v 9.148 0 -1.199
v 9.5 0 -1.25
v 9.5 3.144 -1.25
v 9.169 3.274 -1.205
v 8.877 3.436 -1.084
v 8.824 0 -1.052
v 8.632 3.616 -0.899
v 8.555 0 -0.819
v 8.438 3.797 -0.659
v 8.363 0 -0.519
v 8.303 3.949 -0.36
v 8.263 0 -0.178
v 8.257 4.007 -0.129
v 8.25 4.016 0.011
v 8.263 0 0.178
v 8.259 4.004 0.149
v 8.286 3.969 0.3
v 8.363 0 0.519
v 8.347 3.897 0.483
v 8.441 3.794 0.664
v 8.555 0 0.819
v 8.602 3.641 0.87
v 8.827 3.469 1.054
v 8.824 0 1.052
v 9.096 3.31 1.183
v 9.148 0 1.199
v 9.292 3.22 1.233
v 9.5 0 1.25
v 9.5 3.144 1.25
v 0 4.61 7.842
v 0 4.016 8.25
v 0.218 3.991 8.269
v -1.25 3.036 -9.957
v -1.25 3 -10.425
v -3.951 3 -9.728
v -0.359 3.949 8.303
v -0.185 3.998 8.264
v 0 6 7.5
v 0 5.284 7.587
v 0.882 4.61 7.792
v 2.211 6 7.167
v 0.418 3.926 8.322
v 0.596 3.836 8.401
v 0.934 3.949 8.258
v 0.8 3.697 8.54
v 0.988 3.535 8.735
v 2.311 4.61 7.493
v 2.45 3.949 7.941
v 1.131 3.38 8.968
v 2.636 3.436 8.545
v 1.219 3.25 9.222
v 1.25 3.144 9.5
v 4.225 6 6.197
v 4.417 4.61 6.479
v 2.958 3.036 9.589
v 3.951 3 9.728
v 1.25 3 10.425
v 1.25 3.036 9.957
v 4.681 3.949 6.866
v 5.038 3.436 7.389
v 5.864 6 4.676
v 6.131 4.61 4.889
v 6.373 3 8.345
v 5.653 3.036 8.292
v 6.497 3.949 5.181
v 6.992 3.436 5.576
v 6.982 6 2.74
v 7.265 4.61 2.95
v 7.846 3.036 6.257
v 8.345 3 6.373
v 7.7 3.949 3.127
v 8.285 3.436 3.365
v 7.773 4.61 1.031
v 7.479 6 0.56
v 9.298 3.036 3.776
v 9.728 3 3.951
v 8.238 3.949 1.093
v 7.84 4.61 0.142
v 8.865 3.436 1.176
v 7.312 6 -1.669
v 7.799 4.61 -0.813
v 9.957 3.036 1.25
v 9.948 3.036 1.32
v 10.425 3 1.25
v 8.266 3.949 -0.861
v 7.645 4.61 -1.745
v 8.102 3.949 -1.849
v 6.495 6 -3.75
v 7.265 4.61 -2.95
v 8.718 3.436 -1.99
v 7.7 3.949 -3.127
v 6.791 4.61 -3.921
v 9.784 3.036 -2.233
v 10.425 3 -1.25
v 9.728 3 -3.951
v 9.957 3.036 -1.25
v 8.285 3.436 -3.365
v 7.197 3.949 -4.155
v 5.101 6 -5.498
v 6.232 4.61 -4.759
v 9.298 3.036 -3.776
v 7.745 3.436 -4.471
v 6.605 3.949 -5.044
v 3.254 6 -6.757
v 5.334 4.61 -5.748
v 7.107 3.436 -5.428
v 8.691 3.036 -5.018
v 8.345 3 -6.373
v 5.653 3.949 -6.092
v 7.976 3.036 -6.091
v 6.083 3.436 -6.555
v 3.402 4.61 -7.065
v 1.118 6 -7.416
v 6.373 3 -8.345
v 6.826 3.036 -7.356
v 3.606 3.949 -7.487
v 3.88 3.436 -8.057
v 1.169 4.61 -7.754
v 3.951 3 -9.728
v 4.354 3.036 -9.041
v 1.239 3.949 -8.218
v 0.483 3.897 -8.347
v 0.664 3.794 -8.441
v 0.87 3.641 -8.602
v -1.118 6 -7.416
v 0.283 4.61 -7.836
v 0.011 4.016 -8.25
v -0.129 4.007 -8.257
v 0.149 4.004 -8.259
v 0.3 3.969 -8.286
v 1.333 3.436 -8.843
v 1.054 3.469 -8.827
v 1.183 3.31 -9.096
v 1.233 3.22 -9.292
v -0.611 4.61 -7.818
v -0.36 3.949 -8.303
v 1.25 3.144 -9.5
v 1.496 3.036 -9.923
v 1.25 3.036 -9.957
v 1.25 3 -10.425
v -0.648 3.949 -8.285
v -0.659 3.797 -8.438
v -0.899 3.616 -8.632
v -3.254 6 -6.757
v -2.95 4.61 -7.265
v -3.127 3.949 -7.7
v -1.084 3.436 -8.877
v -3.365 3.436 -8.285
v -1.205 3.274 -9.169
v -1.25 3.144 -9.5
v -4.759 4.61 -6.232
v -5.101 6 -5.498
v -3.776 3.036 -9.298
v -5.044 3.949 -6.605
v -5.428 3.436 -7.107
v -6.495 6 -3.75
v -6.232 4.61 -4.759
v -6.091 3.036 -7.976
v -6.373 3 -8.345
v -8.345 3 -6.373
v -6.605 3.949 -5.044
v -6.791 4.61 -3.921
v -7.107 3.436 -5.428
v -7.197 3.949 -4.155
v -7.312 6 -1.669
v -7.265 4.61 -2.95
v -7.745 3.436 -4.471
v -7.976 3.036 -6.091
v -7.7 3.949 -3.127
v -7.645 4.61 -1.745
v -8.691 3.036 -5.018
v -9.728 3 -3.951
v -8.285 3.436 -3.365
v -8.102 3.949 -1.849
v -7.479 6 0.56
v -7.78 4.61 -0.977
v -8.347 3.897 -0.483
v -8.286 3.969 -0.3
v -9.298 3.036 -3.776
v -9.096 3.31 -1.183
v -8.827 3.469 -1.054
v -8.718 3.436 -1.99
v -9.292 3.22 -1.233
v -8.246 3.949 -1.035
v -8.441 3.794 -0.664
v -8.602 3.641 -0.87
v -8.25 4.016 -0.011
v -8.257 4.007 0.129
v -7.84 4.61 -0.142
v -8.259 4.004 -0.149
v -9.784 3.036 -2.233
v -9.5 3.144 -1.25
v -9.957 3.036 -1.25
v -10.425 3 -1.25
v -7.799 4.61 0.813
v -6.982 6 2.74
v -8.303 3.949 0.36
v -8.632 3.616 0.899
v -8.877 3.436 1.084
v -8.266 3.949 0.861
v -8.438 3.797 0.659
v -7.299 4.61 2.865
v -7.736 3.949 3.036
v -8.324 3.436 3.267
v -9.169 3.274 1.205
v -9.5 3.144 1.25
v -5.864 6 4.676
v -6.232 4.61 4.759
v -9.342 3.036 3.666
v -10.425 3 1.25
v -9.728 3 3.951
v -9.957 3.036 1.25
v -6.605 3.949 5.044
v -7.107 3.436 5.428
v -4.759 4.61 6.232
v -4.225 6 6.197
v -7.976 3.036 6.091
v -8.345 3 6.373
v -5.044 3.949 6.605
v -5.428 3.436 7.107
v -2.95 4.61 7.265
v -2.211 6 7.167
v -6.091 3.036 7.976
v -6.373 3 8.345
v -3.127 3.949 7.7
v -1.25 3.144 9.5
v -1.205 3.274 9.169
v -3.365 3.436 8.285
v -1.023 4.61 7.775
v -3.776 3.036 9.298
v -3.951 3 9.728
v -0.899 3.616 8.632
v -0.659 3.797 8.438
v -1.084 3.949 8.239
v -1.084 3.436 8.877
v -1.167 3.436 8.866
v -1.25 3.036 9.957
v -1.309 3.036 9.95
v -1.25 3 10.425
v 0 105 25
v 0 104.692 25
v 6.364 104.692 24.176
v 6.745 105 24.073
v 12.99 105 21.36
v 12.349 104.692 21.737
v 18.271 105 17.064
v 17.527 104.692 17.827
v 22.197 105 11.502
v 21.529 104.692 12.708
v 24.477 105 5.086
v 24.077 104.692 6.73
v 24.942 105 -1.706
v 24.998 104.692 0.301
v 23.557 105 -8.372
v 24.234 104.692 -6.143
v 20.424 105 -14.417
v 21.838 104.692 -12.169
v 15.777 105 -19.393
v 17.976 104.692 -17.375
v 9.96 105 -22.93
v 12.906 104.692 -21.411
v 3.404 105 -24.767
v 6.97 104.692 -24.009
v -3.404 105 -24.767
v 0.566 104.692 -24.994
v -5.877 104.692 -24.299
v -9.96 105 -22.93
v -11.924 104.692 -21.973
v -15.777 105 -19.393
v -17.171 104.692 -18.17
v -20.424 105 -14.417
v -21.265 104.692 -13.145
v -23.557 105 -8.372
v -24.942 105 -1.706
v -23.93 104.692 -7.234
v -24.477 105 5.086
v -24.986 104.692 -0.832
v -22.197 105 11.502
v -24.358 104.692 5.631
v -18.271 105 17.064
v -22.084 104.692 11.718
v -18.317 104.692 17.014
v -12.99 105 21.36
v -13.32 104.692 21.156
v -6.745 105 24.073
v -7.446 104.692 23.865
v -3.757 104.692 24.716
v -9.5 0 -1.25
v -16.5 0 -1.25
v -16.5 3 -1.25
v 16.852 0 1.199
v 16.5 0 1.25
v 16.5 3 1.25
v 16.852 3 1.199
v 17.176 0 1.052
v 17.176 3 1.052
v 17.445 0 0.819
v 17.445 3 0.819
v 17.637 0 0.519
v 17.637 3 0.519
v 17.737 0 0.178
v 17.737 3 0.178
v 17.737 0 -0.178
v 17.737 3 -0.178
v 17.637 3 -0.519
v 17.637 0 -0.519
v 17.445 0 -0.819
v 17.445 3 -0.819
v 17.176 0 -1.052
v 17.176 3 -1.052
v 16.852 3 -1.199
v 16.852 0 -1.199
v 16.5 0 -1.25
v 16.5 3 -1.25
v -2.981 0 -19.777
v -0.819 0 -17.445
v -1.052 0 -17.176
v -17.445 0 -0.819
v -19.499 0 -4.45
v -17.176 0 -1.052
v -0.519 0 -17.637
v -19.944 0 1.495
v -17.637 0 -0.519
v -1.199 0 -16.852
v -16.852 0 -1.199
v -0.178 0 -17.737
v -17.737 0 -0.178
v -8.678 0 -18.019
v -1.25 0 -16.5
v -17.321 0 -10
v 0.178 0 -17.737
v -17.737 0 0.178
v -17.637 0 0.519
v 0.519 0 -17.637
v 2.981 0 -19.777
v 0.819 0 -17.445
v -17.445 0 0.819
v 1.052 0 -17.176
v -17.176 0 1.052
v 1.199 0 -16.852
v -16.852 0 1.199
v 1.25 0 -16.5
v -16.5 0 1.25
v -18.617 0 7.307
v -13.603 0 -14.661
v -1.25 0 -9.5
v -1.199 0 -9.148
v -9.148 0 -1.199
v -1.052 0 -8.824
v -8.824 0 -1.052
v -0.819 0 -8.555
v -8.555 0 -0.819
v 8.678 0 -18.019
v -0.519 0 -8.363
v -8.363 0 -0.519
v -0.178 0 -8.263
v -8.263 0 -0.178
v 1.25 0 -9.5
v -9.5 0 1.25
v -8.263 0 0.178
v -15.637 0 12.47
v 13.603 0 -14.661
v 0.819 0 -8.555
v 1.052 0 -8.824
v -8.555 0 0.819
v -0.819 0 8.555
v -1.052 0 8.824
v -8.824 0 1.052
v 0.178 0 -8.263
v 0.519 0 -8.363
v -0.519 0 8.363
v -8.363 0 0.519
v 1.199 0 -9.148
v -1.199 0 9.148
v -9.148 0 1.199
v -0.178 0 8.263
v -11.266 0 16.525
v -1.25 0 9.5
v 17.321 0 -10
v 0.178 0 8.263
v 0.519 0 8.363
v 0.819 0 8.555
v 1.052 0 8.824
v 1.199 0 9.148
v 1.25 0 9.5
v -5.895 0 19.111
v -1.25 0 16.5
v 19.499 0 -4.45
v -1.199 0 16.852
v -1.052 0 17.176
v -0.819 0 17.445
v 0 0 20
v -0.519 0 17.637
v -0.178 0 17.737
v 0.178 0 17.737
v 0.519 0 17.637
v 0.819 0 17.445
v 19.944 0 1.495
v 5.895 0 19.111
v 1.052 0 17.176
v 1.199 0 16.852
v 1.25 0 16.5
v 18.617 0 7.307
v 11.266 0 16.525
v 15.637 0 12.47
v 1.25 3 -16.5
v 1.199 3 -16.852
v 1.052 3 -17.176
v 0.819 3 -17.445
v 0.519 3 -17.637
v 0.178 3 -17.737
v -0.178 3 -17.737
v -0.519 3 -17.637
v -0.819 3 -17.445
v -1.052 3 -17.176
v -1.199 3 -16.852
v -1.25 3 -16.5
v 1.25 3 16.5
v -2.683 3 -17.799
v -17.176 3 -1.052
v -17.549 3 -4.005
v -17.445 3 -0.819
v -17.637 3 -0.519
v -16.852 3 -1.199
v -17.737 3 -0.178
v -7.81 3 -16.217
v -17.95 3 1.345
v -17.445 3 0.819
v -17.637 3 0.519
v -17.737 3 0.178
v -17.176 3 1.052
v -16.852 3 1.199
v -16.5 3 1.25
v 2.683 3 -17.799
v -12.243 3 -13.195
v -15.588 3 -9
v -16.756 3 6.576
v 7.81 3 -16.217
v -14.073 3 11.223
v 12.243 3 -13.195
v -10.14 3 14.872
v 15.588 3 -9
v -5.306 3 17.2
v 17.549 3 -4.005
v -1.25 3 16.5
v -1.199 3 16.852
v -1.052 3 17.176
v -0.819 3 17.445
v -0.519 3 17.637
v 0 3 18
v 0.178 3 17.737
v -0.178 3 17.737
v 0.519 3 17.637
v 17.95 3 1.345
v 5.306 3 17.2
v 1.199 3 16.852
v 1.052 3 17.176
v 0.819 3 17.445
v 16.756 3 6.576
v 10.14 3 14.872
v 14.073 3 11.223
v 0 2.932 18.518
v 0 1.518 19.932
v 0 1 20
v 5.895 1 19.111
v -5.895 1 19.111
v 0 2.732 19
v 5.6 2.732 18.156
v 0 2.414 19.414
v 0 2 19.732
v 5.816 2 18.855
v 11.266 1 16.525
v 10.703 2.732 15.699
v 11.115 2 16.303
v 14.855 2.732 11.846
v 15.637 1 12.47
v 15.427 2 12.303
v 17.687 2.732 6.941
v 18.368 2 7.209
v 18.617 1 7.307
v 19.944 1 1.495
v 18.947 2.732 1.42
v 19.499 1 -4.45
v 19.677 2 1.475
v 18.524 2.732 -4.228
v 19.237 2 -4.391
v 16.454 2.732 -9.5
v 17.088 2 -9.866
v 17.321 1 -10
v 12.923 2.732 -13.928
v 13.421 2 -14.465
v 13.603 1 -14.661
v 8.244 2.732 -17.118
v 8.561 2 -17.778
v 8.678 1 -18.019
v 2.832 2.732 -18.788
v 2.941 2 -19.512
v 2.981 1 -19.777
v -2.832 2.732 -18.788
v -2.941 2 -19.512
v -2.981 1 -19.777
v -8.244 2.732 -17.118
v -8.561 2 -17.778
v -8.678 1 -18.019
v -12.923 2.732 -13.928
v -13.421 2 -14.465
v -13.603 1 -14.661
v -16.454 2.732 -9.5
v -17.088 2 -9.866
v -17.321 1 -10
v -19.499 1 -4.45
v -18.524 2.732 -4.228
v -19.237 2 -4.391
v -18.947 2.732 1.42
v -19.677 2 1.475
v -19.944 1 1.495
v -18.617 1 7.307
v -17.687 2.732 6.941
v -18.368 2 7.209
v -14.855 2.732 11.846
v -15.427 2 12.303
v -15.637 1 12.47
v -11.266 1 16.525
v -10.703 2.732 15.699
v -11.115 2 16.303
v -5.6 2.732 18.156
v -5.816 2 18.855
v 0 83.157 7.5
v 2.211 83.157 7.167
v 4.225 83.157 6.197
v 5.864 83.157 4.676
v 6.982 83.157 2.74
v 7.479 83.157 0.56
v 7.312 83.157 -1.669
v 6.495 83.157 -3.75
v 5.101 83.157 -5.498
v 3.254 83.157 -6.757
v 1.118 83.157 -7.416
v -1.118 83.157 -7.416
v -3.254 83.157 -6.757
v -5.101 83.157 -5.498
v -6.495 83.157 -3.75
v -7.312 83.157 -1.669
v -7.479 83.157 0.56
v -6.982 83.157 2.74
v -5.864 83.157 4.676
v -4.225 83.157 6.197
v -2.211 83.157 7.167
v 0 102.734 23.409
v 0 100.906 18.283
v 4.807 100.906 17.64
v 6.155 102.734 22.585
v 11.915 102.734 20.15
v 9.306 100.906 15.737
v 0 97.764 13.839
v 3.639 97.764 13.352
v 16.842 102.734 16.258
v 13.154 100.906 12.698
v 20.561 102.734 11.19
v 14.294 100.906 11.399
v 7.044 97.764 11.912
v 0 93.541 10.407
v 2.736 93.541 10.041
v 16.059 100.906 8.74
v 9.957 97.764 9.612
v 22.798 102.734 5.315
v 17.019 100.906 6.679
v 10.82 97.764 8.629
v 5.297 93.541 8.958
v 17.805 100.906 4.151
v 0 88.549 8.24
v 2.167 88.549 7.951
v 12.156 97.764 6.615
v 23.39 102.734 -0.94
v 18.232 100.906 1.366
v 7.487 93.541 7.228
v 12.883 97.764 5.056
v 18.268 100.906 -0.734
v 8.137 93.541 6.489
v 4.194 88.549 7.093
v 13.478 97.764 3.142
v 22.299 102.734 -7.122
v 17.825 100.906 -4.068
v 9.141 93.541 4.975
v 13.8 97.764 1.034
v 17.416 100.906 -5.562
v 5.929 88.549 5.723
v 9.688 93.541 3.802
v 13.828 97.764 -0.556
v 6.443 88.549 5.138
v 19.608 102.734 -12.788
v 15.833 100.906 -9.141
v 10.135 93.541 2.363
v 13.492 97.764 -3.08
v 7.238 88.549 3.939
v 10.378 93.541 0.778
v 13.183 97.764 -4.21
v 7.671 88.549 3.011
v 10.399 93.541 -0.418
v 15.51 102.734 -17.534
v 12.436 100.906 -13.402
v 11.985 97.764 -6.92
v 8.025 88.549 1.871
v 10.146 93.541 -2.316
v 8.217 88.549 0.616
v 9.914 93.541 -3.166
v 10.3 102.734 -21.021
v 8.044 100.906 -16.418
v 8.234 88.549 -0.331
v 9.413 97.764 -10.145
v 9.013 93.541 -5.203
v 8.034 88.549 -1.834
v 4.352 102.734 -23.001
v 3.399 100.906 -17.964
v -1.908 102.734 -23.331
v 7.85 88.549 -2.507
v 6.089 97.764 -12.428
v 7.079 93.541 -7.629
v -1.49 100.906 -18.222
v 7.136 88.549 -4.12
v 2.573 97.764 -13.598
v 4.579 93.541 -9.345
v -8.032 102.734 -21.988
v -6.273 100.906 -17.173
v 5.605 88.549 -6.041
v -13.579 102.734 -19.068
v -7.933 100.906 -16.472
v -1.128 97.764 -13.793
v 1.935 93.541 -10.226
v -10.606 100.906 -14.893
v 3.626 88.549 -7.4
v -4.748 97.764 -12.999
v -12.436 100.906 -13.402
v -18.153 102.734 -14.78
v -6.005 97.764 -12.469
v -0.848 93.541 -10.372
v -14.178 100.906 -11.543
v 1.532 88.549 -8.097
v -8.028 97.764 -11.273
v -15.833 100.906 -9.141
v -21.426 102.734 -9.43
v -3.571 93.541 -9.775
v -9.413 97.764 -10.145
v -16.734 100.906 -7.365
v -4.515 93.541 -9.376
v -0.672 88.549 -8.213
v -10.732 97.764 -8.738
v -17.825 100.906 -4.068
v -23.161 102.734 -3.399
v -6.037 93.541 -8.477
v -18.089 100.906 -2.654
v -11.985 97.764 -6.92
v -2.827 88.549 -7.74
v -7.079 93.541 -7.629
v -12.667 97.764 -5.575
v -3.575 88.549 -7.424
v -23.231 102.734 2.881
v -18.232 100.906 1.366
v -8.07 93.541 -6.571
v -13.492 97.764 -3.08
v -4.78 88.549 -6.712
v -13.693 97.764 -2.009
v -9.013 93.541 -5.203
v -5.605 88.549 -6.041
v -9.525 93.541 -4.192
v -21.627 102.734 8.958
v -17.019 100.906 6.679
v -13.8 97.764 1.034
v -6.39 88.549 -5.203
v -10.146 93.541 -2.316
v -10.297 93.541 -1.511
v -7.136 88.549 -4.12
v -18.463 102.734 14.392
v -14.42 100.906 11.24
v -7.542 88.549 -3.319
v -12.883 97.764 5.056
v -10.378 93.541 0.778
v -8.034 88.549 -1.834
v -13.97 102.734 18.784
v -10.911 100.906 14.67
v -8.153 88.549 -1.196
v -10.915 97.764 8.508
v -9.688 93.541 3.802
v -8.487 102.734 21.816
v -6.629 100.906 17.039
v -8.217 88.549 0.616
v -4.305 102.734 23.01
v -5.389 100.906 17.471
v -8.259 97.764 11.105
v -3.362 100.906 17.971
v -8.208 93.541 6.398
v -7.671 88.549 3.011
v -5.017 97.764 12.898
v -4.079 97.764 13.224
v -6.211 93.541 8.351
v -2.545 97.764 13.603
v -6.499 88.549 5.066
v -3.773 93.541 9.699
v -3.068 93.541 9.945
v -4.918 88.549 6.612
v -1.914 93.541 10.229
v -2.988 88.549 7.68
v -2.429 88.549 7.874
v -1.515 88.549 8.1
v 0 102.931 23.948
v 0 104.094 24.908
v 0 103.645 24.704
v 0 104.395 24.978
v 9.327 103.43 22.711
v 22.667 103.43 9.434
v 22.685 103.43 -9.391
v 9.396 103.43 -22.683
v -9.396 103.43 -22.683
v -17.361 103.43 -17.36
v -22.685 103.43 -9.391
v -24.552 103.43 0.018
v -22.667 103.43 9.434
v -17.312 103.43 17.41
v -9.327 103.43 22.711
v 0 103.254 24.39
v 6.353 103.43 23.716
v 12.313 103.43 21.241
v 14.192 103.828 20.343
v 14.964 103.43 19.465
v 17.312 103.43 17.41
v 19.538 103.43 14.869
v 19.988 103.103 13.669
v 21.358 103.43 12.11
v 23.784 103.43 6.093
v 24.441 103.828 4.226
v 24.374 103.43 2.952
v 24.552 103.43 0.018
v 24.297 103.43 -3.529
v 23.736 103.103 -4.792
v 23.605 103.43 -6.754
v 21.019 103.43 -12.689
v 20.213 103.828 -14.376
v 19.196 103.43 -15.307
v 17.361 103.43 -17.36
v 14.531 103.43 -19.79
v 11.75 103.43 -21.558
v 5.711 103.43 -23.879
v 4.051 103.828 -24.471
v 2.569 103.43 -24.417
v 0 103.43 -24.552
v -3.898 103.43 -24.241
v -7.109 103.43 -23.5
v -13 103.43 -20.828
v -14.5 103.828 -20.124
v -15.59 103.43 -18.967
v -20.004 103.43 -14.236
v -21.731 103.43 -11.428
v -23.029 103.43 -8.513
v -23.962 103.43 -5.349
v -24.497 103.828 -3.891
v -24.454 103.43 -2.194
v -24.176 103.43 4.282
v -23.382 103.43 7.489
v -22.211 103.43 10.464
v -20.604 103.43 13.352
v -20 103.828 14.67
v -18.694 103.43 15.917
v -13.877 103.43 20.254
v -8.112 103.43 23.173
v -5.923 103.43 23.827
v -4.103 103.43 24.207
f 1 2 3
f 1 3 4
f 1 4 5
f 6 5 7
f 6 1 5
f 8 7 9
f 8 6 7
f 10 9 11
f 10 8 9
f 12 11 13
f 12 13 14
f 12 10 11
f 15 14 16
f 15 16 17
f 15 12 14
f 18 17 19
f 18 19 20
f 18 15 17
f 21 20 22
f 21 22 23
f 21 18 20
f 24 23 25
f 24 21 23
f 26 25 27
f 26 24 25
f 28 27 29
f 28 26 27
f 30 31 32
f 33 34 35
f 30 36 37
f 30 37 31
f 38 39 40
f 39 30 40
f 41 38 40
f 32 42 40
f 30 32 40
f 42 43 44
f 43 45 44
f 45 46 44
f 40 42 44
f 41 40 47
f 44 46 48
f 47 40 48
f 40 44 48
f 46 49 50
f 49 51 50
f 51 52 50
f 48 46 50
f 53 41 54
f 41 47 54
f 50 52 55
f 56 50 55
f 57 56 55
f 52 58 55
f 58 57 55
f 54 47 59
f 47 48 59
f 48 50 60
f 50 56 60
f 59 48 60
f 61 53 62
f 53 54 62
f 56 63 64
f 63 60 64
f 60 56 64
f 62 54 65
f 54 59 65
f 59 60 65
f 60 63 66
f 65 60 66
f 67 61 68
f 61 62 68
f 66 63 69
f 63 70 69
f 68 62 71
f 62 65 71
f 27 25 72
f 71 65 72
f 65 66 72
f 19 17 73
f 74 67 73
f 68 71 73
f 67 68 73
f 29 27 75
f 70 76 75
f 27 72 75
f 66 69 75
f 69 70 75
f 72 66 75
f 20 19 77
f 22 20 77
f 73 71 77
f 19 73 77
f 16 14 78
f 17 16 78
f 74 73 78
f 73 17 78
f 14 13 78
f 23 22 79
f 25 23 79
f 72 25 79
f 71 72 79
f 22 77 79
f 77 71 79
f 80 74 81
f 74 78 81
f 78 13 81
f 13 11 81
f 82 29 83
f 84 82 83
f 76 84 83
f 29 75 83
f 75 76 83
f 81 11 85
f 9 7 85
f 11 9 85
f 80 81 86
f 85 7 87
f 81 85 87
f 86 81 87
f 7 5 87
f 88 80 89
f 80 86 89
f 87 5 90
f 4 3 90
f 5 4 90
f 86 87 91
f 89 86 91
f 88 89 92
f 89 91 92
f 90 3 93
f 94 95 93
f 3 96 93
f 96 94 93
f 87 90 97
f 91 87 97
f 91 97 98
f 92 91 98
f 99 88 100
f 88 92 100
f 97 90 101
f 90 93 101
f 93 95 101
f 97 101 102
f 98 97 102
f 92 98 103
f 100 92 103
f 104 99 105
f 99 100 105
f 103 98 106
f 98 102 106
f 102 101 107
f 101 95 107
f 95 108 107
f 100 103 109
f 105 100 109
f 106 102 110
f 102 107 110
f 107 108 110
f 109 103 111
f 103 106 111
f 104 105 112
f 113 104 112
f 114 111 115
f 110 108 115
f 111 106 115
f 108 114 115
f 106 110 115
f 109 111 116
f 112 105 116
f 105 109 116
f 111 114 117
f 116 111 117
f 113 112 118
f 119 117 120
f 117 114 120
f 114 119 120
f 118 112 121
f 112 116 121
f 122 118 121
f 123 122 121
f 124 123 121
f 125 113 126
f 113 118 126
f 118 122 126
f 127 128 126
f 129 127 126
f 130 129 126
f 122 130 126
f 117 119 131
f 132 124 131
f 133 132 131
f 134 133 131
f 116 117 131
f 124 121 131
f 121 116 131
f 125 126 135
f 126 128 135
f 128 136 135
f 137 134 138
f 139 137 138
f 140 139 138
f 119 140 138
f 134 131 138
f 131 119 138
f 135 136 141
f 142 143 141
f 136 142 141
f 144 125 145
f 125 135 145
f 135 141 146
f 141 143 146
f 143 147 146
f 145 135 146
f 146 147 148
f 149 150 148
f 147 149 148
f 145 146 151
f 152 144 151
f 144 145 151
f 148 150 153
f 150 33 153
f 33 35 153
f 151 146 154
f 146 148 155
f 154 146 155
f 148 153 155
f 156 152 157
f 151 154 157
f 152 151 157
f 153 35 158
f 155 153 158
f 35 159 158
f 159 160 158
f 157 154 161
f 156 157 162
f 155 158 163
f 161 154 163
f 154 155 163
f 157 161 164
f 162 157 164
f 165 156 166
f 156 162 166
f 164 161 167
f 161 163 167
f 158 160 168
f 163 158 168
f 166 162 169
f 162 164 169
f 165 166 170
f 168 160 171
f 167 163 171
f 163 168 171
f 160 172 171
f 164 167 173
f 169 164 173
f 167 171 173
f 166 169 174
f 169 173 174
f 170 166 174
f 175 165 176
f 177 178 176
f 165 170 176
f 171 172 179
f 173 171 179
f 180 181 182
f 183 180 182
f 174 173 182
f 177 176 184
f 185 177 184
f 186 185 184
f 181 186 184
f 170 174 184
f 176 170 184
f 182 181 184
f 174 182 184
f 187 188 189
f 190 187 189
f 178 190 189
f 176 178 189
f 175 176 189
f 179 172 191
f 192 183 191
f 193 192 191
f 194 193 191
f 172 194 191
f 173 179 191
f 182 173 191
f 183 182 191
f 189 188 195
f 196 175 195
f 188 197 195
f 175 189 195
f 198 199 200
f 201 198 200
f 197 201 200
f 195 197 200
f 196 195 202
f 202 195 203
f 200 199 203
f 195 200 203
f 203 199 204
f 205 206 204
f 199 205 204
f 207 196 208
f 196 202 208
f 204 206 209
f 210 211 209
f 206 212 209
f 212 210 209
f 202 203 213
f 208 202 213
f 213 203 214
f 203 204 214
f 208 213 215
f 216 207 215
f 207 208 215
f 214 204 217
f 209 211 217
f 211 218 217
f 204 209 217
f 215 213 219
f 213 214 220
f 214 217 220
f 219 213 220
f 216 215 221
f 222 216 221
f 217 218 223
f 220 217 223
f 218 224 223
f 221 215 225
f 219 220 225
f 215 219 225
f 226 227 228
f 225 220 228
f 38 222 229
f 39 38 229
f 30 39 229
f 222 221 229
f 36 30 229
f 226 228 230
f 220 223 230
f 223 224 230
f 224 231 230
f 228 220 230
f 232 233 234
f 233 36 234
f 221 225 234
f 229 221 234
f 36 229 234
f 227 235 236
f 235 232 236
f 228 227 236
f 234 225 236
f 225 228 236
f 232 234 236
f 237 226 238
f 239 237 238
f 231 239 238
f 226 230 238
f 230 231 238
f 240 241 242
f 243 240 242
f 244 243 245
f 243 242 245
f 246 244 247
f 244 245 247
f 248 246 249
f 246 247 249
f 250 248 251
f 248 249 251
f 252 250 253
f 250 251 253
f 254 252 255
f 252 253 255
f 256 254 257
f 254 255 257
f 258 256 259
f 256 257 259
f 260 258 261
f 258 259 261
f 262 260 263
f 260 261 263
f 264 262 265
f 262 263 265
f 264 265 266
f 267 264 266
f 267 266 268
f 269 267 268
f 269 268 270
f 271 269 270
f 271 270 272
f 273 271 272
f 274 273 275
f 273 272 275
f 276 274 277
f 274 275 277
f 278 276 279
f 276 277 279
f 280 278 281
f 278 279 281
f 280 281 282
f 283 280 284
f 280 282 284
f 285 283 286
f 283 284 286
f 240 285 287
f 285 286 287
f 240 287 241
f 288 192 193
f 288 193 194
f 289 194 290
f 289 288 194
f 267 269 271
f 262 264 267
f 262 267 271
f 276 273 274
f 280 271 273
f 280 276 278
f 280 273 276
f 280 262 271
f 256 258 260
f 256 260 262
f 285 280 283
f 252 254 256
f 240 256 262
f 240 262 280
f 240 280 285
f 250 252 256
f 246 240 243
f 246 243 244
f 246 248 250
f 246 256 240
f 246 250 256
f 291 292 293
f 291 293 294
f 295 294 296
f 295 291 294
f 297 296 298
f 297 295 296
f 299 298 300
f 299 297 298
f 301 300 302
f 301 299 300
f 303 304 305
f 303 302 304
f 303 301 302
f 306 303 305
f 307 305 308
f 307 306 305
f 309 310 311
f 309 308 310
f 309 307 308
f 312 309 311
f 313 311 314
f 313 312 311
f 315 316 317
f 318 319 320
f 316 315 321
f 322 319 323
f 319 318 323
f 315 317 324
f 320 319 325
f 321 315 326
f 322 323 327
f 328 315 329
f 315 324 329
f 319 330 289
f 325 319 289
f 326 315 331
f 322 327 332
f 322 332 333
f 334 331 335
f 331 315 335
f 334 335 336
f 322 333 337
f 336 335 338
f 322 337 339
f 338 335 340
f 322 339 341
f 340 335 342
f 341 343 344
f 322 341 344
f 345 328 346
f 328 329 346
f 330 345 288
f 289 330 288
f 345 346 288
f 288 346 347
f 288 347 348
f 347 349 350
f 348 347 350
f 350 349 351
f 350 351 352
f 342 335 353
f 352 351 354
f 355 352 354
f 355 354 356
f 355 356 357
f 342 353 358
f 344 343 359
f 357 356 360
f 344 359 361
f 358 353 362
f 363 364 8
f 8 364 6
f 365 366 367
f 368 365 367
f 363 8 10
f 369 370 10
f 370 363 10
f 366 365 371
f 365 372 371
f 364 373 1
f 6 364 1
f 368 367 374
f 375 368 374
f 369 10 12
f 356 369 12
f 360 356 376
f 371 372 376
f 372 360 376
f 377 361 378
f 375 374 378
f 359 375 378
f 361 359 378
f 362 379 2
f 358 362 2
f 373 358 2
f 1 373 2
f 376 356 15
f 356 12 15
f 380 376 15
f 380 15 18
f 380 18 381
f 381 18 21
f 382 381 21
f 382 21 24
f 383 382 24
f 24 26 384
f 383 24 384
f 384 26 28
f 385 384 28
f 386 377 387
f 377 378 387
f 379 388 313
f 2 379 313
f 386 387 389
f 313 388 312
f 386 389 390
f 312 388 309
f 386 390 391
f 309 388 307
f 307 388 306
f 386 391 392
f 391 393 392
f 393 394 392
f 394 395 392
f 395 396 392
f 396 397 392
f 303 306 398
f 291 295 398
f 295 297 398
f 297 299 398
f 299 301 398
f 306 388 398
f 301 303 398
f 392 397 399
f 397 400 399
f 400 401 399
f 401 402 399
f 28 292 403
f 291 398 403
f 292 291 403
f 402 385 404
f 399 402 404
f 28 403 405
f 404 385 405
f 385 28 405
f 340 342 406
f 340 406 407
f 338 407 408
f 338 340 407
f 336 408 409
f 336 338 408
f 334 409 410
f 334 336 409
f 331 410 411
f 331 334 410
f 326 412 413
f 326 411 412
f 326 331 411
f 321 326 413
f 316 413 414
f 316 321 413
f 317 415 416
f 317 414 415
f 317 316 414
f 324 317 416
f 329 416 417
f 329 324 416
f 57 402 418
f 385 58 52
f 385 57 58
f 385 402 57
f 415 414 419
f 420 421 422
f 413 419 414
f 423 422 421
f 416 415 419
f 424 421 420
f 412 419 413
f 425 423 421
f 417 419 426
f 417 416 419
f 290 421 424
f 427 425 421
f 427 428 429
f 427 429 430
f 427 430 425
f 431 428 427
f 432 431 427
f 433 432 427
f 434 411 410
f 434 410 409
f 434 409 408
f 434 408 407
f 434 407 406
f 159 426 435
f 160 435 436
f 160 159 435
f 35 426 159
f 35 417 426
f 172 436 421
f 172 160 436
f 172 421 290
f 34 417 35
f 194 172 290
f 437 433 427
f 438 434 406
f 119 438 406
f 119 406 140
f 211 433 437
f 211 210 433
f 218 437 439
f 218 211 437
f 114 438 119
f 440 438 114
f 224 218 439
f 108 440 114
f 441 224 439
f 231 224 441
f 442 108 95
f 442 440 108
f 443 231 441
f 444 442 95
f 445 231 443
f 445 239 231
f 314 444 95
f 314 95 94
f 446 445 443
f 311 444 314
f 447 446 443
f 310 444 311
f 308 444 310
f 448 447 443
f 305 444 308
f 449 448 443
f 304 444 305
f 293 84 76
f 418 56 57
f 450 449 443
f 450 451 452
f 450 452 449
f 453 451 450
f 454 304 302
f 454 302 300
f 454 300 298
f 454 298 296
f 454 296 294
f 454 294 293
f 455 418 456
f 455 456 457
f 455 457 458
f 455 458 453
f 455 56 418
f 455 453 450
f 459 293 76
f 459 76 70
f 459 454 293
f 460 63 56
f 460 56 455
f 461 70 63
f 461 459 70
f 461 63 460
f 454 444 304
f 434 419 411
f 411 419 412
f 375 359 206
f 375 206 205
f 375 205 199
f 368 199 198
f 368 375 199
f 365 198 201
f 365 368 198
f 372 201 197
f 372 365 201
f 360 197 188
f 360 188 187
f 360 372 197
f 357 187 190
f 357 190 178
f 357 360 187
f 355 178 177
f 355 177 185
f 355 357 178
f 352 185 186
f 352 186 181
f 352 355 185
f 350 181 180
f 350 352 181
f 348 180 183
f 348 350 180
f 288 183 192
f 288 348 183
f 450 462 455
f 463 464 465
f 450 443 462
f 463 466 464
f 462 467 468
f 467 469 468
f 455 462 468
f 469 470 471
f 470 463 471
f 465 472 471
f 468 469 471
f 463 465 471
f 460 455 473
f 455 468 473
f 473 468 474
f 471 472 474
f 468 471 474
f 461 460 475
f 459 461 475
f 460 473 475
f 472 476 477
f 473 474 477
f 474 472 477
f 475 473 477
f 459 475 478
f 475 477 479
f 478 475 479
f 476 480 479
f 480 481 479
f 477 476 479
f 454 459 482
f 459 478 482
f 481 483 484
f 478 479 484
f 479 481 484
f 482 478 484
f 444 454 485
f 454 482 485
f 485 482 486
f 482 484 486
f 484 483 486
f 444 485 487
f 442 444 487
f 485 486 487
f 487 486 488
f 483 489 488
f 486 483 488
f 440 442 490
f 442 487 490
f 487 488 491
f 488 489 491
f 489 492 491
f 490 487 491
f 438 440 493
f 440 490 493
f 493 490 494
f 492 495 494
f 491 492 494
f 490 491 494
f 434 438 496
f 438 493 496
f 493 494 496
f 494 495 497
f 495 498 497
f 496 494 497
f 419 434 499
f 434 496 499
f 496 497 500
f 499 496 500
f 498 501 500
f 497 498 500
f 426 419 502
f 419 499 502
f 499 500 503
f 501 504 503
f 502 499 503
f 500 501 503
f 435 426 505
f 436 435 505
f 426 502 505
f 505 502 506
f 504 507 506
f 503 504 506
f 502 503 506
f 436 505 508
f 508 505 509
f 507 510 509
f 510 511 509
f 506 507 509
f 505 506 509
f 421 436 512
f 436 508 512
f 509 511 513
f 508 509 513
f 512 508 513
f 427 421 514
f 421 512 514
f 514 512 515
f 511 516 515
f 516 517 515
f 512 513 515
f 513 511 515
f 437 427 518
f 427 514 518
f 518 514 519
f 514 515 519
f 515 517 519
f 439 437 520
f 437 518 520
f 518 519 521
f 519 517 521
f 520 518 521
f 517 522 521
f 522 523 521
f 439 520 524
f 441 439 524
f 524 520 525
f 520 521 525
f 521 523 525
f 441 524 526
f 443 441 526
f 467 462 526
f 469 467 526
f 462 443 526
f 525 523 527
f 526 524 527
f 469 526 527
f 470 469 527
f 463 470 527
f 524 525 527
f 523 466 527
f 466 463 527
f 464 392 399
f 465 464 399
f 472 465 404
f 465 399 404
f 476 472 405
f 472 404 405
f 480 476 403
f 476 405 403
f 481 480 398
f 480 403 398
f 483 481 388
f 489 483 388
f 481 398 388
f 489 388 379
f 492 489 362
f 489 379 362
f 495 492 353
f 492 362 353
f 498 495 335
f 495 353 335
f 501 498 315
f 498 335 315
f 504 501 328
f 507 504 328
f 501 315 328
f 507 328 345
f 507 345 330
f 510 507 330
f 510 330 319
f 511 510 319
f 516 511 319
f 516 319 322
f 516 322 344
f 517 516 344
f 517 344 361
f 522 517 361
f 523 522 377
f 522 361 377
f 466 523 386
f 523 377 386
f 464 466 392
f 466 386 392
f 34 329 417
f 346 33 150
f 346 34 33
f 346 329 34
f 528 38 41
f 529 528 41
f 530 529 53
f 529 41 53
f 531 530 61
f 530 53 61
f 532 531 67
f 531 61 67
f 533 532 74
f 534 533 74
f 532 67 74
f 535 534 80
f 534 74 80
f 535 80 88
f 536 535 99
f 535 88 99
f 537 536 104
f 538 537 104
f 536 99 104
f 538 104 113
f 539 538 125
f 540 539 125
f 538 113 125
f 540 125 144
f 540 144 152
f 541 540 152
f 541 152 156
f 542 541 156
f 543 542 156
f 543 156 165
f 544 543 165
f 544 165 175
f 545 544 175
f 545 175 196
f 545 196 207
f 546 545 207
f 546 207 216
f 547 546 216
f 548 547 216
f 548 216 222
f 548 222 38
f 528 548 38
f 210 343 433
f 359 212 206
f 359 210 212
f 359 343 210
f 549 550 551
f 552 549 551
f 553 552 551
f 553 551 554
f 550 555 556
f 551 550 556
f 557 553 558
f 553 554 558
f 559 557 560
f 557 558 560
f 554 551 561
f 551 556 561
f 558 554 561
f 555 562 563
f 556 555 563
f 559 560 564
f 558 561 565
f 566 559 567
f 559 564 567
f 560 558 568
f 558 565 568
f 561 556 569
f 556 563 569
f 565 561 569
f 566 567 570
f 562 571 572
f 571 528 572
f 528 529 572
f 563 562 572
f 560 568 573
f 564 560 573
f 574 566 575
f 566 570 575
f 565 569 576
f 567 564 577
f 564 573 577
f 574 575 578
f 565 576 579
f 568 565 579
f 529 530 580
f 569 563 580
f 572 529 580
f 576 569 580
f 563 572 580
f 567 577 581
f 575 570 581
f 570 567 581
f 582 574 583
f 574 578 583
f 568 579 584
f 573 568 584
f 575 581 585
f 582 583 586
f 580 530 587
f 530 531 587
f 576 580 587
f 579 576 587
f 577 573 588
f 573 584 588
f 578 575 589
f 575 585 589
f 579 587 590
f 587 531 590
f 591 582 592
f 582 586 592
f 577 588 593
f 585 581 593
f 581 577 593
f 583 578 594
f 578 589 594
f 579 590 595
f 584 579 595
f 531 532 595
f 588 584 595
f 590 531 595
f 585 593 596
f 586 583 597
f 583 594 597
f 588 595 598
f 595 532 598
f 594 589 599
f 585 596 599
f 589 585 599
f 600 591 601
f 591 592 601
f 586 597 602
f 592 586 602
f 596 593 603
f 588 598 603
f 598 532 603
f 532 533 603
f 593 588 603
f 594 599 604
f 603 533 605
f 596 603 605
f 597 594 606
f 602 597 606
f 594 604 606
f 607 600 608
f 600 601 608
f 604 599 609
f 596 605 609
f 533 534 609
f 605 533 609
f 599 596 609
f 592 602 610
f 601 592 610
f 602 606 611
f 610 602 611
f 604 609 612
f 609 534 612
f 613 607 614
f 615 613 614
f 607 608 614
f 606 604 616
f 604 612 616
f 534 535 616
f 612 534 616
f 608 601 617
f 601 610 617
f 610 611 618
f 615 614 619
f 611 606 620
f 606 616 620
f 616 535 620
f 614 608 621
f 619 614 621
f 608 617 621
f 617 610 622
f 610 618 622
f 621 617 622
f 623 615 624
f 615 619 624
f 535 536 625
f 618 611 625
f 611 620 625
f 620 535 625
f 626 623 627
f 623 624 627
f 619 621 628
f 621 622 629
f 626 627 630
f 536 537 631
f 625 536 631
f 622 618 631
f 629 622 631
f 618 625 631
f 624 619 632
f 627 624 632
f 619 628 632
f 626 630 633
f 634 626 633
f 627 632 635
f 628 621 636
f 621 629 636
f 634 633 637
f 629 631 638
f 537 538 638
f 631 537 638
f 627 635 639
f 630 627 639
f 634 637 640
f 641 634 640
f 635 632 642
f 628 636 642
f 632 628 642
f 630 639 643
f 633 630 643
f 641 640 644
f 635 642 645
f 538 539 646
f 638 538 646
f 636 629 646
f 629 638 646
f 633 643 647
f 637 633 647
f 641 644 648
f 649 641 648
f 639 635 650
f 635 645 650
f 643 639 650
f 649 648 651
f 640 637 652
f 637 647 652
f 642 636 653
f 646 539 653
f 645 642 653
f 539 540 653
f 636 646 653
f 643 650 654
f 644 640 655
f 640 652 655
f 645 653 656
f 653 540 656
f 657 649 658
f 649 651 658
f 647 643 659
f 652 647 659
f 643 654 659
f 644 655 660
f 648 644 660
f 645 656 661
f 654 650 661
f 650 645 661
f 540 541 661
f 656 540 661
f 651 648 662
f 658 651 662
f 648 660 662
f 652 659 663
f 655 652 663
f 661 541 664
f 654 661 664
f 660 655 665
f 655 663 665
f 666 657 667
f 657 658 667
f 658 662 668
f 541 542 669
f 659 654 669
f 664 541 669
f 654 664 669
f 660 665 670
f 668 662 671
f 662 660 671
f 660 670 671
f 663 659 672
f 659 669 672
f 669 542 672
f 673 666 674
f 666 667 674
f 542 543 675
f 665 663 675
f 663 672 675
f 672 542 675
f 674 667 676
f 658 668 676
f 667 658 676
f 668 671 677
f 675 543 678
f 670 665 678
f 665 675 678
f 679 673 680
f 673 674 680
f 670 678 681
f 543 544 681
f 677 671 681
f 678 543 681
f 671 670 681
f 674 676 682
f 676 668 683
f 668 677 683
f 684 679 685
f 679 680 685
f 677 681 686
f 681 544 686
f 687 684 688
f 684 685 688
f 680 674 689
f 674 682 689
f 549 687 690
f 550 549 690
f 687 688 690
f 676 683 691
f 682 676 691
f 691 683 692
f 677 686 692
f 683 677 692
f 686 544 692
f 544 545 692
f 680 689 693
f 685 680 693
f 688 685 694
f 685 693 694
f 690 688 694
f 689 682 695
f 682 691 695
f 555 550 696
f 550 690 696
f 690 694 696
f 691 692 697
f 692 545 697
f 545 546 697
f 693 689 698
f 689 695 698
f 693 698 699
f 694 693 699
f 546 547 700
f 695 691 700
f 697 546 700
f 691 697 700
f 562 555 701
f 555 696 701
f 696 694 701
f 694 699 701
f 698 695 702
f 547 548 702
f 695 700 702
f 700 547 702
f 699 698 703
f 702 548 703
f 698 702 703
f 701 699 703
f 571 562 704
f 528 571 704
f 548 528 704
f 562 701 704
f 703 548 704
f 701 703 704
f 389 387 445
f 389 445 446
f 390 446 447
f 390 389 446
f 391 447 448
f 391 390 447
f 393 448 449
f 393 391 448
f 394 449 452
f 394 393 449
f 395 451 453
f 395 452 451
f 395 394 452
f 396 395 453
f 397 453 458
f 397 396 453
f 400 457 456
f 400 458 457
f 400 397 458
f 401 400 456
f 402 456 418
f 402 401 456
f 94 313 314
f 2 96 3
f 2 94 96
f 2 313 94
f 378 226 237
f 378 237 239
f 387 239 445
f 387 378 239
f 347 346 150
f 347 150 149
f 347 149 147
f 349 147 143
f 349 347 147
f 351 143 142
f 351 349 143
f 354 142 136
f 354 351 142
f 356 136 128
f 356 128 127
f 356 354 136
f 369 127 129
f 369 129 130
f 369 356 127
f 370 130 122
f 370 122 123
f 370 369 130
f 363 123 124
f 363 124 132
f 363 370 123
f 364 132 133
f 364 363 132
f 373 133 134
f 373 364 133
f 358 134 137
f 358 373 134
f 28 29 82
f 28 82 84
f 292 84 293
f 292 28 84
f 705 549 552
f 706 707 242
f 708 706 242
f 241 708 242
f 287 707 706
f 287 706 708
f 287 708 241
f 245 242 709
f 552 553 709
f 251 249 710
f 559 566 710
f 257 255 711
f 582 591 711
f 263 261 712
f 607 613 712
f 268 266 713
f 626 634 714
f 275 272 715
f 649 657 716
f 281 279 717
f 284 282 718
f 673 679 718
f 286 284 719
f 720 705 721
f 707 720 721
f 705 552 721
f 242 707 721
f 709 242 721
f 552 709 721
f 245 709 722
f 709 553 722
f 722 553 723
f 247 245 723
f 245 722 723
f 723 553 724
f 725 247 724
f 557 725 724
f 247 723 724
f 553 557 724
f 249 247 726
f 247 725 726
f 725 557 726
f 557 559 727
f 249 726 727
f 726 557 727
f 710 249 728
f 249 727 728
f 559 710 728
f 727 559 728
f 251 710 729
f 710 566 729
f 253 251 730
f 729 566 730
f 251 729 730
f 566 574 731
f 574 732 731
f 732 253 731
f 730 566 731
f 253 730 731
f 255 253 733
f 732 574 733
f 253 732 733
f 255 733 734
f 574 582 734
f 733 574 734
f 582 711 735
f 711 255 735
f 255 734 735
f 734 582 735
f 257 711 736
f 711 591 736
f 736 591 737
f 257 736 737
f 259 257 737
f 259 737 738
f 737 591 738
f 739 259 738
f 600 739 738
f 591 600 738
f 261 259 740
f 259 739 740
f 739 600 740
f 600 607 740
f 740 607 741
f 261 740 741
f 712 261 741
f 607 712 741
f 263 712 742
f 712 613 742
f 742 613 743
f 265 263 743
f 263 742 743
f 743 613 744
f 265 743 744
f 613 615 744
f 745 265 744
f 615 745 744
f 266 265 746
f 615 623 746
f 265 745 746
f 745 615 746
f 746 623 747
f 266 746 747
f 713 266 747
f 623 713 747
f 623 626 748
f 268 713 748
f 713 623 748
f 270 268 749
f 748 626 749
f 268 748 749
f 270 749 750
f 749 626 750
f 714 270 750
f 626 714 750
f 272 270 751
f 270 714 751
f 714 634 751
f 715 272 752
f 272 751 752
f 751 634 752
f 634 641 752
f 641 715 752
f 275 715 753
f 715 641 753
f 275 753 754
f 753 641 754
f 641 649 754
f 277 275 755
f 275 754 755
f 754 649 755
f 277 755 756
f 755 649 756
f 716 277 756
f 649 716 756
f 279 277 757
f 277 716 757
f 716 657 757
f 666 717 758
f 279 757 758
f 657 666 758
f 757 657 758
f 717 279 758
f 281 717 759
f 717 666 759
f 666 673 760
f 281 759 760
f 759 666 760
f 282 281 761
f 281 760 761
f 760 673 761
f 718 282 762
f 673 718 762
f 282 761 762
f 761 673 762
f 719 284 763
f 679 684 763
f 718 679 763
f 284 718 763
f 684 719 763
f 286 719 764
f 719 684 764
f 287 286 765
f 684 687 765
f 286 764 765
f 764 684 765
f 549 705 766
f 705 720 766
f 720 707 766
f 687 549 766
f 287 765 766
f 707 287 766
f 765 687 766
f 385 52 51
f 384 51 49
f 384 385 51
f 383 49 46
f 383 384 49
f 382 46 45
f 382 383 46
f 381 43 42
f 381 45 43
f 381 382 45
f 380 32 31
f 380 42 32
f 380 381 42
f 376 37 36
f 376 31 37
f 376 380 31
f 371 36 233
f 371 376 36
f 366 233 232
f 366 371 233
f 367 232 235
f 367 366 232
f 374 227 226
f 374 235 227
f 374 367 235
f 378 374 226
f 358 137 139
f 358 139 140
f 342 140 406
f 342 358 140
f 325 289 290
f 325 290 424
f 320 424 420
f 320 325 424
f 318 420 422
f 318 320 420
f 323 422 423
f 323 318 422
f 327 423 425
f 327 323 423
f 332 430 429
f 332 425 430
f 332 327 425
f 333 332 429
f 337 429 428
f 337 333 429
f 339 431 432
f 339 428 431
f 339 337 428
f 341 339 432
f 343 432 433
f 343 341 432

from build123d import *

# Parameters (mm, degrees)
SKETCH1_R           = 20
BOSS_EXTRUDE1_DEPTH = 3
SKETCH2_R           = 7.5
BOSS_EXTRUDE2_DEPTH = 100
SKETCH3_R           = 25
BOSS_EXTRUDE3_DEPTH = 2
FILLET3_R           = 20
FILLET4_R           = 2
FILLET6_R           = 3
CUT_EXTRUDE1_REACH  = 112.793
FILLET8_R           = 2


with BuildPart() as part:
    # Sketch1 → Boss-Extrude1 (new body)
    with BuildSketch(Plane(origin=(0, 0, 0), x_dir=(1, 0, 0), z_dir=(0, 1, 0))):
        with Locations(Location((0, 0, 0), (0, 0, 270))):
            Circle(SKETCH1_R)
    extrude(amount=BOSS_EXTRUDE1_DEPTH)

    # Sketch2 → Boss-Extrude2 (add)
    with BuildSketch(Plane(origin=(0, 3, 0), x_dir=(1, 0, 0), z_dir=(0, 1, 0))):
        with Locations(Location((0, 0, 0), (0, 0, 270))):
            Circle(SKETCH2_R)
    extrude(amount=BOSS_EXTRUDE2_DEPTH)

    # Sketch3 → Boss-Extrude3 (add)
    with BuildSketch(Plane(origin=(0, 103, 0), x_dir=(1, 0, 0), z_dir=(0, 1, 0))):
        with Locations(Location((0, 0, 0), (0, 0, 270))):
            Circle(SKETCH3_R)
    extrude(amount=BOSS_EXTRUDE3_DEPTH)

    # Fillet3
    # the kernel refuses this fillet: 20 mm, written as the material it adds along each edge
    with BuildSketch(Plane(origin=(0, 103, 0), x_dir=(0, 0, 1), z_dir=(-1, 0, 0))) as fillet3_piece_1:
        with BuildLine():
            CenterArc((27.5, -19.843134833), FILLET3_R, 97.180755781, 82.819244219)
            Line((7.5, -19.843134833), (7.1, -19.843134833))
            Line((7.1, -19.843134833), (7.1, 0))
            Line((7.1, 0), (7.5, 0.4))
            ThreePointArc((7.5, 0.4), (16.25, 0.4), (24.95, 0.396862697))
            Line((24.95, 0.396862697), (25, 0))
        make_face()
    revolve(axis=Axis((0, 103, 0), (0, 1, 0)))

    # Fillet4
    fillet4_edges = [part.edges().sort_by_distance(p)[0] for p in [
        (0, 103, -25),
    ]]
    fillet(fillet4_edges, radius=FILLET4_R)

    # Fillet6
    fillet6_edges = [part.edges().sort_by_distance(p)[0] for p in [
        (0, 3, -7.5),
    ]]
    fillet(fillet6_edges, radius=FILLET6_R)

    # Sketch4 → Cut-Extrude1 (cut, up to next)
    with BuildSketch(Plane.XZ, mode=Mode.PRIVATE) as cut_extrude1_sk1:
        with BuildLine():
            Line((-1.25, -16.5), (-1.25, -9.5))
            ThreePointArc((-1.25, -9.5), (0, -8.25), (1.25, -9.5))
            Line((1.25, -9.5), (1.25, -16.5))
            ThreePointArc((1.25, -16.5), (0, -17.75), (-1.25, -16.5))
        make_face()
    cut_extrude1_tool1 = extrude(cut_extrude1_sk1.sketch, amount=-CUT_EXTRUDE1_REACH, mode=Mode.PRIVATE) & part.part
    # Sketch4 → Cut-Extrude1 (cut, up to next)
    with BuildSketch(Plane.XZ, mode=Mode.PRIVATE) as cut_extrude1_sk2:
        with BuildLine():
            Line((-16.5, 1.25), (-9.5, 1.25))
            ThreePointArc((-9.5, 1.25), (-8.25, 0), (-9.5, -1.25))
            Line((-9.5, -1.25), (-16.5, -1.25))
            ThreePointArc((-16.5, -1.25), (-17.75, 0), (-16.5, 1.25))
        make_face()
    cut_extrude1_tool2 = extrude(cut_extrude1_sk2.sketch, amount=-CUT_EXTRUDE1_REACH, mode=Mode.PRIVATE) & part.part
    # Sketch4 → Cut-Extrude1 (cut, up to next)
    with BuildSketch(Plane.XZ, mode=Mode.PRIVATE) as cut_extrude1_sk3:
        with BuildLine():
            Line((1.25, 16.5), (1.25, 9.5))
            ThreePointArc((1.25, 9.5), (0, 8.25), (-1.25, 9.5))
            Line((-1.25, 9.5), (-1.25, 16.5))
            ThreePointArc((-1.25, 16.5), (0, 17.75), (1.25, 16.5))
        make_face()
    cut_extrude1_tool3 = extrude(cut_extrude1_sk3.sketch, amount=-CUT_EXTRUDE1_REACH, mode=Mode.PRIVATE) & part.part
    # Sketch4 → Cut-Extrude1 (cut, up to next)
    with BuildSketch(Plane.XZ, mode=Mode.PRIVATE) as cut_extrude1_sk4:
        with BuildLine():
            Line((16.5, -1.25), (9.5, -1.25))
            ThreePointArc((9.5, -1.25), (8.25, 0), (9.5, 1.25))
            Line((9.5, 1.25), (16.5, 1.25))
            ThreePointArc((16.5, 1.25), (17.75, 0), (16.5, -1.25))
        make_face()
    cut_extrude1_tool4 = extrude(cut_extrude1_sk4.sketch, amount=-CUT_EXTRUDE1_REACH, mode=Mode.PRIVATE) & part.part
    add(cut_extrude1_tool1.solids().sort_by_distance((0, 0, -13))[0], mode=Mode.SUBTRACT)
    add(cut_extrude1_tool2.solids().sort_by_distance((-13, 0, 0))[0], mode=Mode.SUBTRACT)
    add(cut_extrude1_tool3.solids().sort_by_distance((0, 0, 13))[0], mode=Mode.SUBTRACT)
    add(cut_extrude1_tool4.solids().sort_by_distance((13, 0, 0))[0], mode=Mode.SUBTRACT)

    # Fillet8
    fillet8_edges = [part.edges().sort_by_distance(p)[0] for p in [
        (0, 3, -20),
    ]]
    fillet(fillet8_edges, radius=FILLET8_R)


solid = part.part
